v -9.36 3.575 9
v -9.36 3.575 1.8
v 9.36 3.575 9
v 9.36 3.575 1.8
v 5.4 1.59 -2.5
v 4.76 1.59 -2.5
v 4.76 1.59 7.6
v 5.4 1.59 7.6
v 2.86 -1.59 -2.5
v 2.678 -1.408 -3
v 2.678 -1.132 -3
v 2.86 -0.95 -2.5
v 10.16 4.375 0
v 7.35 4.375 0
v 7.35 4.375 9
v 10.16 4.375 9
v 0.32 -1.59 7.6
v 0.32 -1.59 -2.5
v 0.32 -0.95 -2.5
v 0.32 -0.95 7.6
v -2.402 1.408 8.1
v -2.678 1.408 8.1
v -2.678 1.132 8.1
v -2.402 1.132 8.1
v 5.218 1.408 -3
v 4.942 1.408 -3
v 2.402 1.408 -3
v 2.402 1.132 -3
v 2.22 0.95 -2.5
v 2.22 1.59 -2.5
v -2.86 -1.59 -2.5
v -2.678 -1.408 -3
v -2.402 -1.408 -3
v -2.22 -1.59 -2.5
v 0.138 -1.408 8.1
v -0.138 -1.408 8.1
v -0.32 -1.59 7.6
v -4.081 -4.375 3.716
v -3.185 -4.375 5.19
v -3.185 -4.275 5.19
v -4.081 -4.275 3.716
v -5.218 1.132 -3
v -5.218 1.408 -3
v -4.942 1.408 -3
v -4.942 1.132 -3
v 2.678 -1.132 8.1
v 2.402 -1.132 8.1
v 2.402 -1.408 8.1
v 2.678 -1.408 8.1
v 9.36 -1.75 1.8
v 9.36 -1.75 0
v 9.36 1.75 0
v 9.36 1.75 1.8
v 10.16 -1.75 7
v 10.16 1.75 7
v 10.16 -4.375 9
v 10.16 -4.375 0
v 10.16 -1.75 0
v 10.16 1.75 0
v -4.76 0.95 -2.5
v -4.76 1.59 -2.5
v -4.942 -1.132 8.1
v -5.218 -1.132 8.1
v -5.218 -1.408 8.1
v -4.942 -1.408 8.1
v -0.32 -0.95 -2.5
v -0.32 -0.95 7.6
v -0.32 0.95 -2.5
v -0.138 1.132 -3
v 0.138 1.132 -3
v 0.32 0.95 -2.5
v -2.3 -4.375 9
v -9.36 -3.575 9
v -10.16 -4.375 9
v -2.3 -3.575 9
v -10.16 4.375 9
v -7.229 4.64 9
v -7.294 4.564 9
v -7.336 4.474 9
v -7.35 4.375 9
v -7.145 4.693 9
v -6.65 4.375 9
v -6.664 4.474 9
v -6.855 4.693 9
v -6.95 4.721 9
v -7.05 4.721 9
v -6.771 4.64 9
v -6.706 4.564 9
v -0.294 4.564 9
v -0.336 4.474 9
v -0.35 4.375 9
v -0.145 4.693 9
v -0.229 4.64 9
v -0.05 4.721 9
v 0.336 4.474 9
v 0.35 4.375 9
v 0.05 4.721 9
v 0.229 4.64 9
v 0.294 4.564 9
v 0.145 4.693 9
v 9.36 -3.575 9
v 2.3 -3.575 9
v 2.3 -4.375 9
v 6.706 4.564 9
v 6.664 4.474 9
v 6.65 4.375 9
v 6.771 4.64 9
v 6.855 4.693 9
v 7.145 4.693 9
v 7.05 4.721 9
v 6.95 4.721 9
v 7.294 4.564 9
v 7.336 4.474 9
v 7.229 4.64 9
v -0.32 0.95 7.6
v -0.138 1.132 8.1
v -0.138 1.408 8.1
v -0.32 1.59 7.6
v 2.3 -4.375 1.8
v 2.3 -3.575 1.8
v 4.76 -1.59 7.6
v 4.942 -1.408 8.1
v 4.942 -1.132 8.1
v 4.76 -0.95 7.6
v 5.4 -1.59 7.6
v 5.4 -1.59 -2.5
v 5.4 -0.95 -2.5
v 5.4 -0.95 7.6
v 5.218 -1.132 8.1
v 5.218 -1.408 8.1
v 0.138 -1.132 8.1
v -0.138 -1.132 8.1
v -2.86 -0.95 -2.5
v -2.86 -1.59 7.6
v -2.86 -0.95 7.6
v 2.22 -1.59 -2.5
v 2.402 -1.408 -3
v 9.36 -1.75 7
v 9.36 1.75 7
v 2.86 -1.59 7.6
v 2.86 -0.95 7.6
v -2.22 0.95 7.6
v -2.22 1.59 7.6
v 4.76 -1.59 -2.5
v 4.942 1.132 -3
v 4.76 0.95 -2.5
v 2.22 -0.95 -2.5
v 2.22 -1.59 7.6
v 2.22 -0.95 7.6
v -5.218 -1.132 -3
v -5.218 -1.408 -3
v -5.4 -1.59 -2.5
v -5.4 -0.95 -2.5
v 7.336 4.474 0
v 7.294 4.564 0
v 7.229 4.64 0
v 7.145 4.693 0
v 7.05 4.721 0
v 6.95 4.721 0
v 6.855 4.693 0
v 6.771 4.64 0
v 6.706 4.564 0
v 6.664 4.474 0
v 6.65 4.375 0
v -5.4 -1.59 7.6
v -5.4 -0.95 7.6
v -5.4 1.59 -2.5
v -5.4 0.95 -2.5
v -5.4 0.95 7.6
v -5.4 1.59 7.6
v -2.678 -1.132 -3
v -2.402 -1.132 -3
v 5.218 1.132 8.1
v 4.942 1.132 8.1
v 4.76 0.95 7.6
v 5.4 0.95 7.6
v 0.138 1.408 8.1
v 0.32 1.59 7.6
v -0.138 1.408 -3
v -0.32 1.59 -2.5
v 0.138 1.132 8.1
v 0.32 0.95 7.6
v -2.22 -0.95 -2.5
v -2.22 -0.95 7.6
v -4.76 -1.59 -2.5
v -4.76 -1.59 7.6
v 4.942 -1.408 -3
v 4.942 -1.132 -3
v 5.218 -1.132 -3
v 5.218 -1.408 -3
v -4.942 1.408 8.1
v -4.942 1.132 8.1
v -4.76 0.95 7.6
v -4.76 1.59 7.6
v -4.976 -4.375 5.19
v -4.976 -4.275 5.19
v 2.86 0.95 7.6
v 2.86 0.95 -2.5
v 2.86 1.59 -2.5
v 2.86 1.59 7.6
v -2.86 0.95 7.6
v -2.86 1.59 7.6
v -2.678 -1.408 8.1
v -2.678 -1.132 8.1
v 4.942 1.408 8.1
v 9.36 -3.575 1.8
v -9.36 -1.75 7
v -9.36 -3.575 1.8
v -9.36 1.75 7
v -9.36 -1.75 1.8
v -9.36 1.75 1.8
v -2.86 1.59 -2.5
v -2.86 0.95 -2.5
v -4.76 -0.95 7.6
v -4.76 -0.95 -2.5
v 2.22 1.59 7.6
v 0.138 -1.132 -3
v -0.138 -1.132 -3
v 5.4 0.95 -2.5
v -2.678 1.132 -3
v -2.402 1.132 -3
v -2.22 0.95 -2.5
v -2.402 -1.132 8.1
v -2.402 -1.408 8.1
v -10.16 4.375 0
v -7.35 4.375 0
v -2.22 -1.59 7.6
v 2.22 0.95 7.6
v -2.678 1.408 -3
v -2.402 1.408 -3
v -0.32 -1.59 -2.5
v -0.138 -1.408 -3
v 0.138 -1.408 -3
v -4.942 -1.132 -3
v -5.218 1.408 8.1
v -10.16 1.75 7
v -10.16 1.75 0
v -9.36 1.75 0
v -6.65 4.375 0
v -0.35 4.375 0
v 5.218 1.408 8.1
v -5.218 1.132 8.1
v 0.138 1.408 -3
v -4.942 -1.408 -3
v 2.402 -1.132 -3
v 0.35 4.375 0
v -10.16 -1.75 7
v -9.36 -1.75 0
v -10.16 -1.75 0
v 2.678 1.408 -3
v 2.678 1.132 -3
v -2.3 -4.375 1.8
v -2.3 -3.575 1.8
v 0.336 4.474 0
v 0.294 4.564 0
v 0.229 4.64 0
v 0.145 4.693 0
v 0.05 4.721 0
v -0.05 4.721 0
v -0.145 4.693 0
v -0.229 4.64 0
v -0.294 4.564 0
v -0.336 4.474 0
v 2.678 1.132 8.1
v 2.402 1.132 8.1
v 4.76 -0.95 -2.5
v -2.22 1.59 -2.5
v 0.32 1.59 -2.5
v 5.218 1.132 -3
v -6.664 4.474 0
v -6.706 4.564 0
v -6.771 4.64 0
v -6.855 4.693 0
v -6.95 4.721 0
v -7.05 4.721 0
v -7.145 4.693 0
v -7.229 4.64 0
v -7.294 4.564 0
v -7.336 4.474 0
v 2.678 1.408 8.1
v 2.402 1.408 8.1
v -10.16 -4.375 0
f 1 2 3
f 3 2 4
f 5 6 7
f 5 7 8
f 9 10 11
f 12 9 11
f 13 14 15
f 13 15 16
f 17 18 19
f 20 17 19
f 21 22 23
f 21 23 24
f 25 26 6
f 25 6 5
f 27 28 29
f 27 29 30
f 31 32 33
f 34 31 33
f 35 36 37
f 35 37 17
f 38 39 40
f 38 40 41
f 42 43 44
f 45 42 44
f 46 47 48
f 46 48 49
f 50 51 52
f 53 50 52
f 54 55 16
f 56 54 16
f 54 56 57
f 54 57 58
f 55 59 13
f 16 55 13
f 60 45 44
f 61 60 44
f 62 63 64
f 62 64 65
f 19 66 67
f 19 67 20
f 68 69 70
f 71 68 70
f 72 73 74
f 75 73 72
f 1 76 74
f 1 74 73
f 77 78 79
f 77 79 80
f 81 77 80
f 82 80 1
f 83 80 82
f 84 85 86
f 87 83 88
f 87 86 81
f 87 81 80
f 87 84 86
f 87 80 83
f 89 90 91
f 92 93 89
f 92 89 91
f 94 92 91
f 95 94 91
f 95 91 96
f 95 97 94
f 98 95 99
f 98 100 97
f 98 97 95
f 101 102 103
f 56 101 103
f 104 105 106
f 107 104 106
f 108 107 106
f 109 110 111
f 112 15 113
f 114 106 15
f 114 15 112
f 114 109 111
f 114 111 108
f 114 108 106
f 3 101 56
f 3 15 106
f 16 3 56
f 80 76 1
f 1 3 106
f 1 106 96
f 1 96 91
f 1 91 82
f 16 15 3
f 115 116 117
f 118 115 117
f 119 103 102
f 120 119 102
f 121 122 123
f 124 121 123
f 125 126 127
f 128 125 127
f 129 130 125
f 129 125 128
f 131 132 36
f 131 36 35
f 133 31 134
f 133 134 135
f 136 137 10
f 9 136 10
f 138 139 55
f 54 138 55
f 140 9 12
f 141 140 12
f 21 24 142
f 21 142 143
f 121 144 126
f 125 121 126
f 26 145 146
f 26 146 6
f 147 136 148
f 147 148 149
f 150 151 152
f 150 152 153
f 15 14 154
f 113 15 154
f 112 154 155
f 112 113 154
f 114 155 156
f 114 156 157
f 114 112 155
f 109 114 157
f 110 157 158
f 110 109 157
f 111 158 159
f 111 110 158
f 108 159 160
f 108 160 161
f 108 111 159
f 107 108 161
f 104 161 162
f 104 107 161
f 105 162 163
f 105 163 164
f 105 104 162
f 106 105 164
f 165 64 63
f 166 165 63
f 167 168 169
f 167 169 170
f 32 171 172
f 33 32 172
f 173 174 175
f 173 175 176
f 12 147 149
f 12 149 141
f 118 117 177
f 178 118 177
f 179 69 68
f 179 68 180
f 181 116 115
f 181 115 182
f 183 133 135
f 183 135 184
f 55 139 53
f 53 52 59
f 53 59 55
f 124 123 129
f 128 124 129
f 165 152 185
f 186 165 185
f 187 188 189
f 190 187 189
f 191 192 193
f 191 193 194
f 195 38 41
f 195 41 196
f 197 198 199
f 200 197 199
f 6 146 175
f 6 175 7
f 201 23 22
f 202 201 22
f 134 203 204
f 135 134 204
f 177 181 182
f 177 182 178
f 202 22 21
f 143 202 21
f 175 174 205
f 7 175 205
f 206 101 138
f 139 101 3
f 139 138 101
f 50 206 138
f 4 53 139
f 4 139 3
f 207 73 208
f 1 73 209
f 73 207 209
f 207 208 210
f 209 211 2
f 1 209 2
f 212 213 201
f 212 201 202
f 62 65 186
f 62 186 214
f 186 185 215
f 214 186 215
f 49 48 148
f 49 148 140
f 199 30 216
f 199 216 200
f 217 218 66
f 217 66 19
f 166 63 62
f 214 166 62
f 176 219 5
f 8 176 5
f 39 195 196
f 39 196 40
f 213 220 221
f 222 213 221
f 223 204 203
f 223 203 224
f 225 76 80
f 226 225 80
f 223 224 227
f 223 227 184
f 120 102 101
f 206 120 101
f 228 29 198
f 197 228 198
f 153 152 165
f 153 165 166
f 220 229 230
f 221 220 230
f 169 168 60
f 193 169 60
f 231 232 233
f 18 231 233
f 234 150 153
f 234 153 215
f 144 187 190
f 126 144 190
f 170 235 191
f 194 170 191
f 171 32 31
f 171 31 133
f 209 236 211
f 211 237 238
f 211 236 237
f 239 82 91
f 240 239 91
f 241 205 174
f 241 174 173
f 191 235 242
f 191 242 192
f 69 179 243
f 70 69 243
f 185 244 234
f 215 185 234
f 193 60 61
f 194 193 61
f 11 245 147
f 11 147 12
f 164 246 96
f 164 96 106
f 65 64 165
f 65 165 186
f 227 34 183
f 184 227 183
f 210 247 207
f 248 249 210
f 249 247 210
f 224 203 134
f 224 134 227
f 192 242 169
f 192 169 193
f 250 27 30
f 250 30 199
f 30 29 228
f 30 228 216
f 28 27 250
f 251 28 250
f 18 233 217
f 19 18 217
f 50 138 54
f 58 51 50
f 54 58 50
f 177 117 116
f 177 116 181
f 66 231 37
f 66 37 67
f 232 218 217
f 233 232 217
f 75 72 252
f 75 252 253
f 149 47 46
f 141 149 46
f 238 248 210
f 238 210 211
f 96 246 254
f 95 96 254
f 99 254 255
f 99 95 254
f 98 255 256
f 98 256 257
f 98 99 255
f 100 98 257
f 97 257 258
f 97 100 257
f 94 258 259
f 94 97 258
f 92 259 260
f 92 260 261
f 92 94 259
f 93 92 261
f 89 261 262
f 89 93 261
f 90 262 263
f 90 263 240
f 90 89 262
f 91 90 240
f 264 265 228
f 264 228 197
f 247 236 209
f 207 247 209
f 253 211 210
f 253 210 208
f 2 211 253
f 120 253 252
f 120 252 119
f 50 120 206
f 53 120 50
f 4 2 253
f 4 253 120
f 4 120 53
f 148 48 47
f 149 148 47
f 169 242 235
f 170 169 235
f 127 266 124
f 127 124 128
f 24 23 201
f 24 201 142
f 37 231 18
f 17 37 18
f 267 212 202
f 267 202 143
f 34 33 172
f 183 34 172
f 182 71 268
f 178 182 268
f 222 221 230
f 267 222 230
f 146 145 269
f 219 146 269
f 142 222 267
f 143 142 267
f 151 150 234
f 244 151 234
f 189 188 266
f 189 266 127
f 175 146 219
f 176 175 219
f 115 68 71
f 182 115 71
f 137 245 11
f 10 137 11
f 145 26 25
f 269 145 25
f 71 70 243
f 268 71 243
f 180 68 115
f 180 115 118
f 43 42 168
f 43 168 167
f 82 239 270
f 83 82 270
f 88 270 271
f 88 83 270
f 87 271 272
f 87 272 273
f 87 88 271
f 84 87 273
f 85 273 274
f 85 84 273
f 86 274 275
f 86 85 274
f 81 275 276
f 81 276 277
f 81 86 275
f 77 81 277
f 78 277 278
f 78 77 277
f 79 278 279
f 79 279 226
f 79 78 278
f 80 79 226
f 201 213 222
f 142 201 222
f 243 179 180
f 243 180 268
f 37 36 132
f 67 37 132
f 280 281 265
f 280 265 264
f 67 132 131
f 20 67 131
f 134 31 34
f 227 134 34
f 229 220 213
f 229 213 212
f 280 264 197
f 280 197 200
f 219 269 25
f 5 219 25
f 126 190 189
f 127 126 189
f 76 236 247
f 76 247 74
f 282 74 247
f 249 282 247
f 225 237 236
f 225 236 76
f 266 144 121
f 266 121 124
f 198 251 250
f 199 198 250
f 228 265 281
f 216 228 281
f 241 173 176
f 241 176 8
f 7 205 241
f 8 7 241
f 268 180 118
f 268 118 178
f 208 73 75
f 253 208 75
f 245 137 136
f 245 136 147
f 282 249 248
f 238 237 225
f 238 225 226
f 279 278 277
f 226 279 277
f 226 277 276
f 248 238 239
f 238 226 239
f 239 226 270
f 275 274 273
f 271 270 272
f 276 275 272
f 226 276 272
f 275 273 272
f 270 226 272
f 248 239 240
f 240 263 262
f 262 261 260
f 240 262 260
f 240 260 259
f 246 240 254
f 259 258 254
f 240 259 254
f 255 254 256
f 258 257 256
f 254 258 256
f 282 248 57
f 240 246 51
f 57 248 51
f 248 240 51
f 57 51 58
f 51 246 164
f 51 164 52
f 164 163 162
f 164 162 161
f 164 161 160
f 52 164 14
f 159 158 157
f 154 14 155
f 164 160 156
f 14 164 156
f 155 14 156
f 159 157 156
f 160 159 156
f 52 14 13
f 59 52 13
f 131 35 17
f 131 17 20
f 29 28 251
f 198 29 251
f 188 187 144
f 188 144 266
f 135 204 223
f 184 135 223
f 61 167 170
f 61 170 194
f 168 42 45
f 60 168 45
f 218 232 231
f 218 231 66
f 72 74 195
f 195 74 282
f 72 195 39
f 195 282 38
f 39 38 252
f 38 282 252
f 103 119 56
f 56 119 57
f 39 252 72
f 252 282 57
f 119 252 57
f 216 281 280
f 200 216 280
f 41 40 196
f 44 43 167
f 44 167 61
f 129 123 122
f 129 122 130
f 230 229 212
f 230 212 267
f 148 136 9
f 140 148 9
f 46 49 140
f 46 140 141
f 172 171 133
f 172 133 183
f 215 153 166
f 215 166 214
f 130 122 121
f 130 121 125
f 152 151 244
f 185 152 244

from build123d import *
from OCP.BRepFilletAPI import BRepFilletAPI_MakeChamfer

# Parameters (mm, degrees)
SKETCH_1_W               = 20.32
SKETCH_1_H               = 8.75
EXTRUDE_1_DEPTH          = 1.8
SKETCH_2_W               = 20.32
SKETCH_2_H               = 8.75
SKETCH_2_W_2             = 18.72
SKETCH_2_H_2             = 7.15
EXTRUDE_2_DEPTH          = 7.2
CUT_EXTRUDE_START        = -1.8
SKETCH_3_W               = 0.8
SKETCH_3_H               = 3.5
CUT_EXTRUDE_1_DEPTH      = 7
SKETCH_4_W               = 4.6
SKETCH_4_H               = 0.8
CUT_EXTRUDE_2_DEPTH      = 7.2
EXTRUDE_3_DEPTH          = 6.3
EXTRUDE_3_DEPTH_BACK     = 4.8
SKETCH_5_W               = 0.64
SKETCH_5_H               = 0.64
CHAMFER_2_SIZE           = 0.5
CHAMFER_2_SIZE2          = 0.181985117
CHAMFER_8_SIZE           = 0.5
CHAMFER_8_SIZE2          = 0.181985117
CUT_EXTRUDE_3_DEPTH      = 0.1
PATTERN_LINEAR_1_COUNT   = 3
PATTERN_LINEAR_1_PITCH   = 2.54
PATTERN_LINEAR_1_2_COUNT = 2
PATTERN_LINEAR_1_2_PITCH = 2.54
SKETCH_7_R               = 0.35
EXTRUDE_4_DEPTH          = 9


with BuildPart() as part:
    # Эскиз1 → Бобышка-Вытянуть1 (new body)
    with BuildSketch(Plane.XY):
        Rectangle(SKETCH_1_W, SKETCH_1_H)
    extrude(amount=EXTRUDE_1_DEPTH)

    # Эскиз2 → Бобышка-Вытянуть2 (add)
    with BuildSketch(Plane.XY.offset(1.8)):
        Rectangle(SKETCH_2_W, SKETCH_2_H)
        Rectangle(SKETCH_2_W_2, SKETCH_2_H_2, mode=Mode.SUBTRACT)
    extrude(amount=EXTRUDE_2_DEPTH)

    # Эскиз3 → Вырез-Вытянуть1 (cut)
    with BuildSketch(Plane.XY.offset(1.8).offset(CUT_EXTRUDE_START)):
        with Locations((9.76, 0)):
            Rectangle(SKETCH_3_W, SKETCH_3_H)
        with Locations((-9.76, 0)):
            Rectangle(SKETCH_3_W, SKETCH_3_H)
    extrude(amount=CUT_EXTRUDE_1_DEPTH, mode=Mode.SUBTRACT)

    # Эскиз4 → Вырез-Вытянуть2 (cut)
    with BuildSketch(Plane.XY.offset(9)):
        with Locations((0, -3.975)):
            Rectangle(SKETCH_4_W, SKETCH_4_H)
    extrude(amount=-CUT_EXTRUDE_2_DEPTH, mode=Mode.SUBTRACT)

    # Эскиз6 → Вырез-Вытянуть3 (cut)
    with BuildSketch(Plane.XZ.offset(4.375)):
        Polygon((-4.976440372, 5.189720174), (-3.184624847, 5.189720174), (-4.08053261, 3.716247509), align=None)
    extrude(amount=-CUT_EXTRUDE_3_DEPTH, mode=Mode.SUBTRACT)

    # Эскиз7 → Бобышка-Вытянуть4 (add)
    with BuildSketch(Plane.XY.offset(9)):
        with Locations((0, 4.375)):
            Circle(SKETCH_7_R)
        with Locations((7, 4.375)):
            Circle(SKETCH_7_R)
        with Locations((-7, 4.375)):
            Circle(SKETCH_7_R)
    extrude(amount=-EXTRUDE_4_DEPTH)


with BuildPart() as body_2:
    # Эскиз5 → Бобышка-Вытянуть3 (new, two sides: drawn at the far end of the back side and taken through both)
    with BuildSketch(Plane.XY.offset(1.8).offset(-EXTRUDE_3_DEPTH_BACK)):
        with Locations((0, 1.27)):
            Rectangle(SKETCH_5_W, SKETCH_5_H)
    extrude(amount=EXTRUDE_3_DEPTH + EXTRUDE_3_DEPTH_BACK)

    # Фаска2: one chamfer whose edges measure the first distance from different faces: ONE call of the kernel's chamfer builder (chamfer() names one face for all edges)
    chamfer_2_edges_1 = [body_2.edges().sort_by_distance(p)[0] for p in [
        (-0.32, 1.27, -3),
    ]]
    chamfer_2_side_1 = [body_2.faces().sort_by_distance(p)[0] for p in [
        (-0.32, 1.27, 2.55),
    ]]
    chamfer_2_edges_2 = [body_2.edges().sort_by_distance(p)[0] for p in [
        (0, 1.59, -3),
    ]]
    chamfer_2_side_2 = [body_2.faces().sort_by_distance(p)[0] for p in [
        (0, 1.59, 2.55),
    ]]
    chamfer_2_edges_3 = [body_2.edges().sort_by_distance(p)[0] for p in [
        (0.32, 1.27, -3),
    ]]
    chamfer_2_side_3 = [body_2.faces().sort_by_distance(p)[0] for p in [
        (0.32, 1.27, 2.55),
    ]]
    chamfer_2_edges_4 = [body_2.edges().sort_by_distance(p)[0] for p in [
        (0, 0.95, -3),
    ]]
    chamfer_2_side_4 = [body_2.faces().sort_by_distance(p)[0] for p in [
        (0, 0.95, 2.55),
    ]]
    chamfer_2 = BRepFilletAPI_MakeChamfer(body_2.part.solid().wrapped)
    for e in chamfer_2_edges_1:
        chamfer_2.Add(CHAMFER_2_SIZE, CHAMFER_2_SIZE2, e.wrapped, chamfer_2_side_1[0].wrapped)  # the first distance lies on this face
    for e in chamfer_2_edges_2:
        chamfer_2.Add(CHAMFER_2_SIZE, CHAMFER_2_SIZE2, e.wrapped, chamfer_2_side_2[0].wrapped)  # the first distance lies on this face
    for e in chamfer_2_edges_3:
        chamfer_2.Add(CHAMFER_2_SIZE, CHAMFER_2_SIZE2, e.wrapped, chamfer_2_side_3[0].wrapped)  # the first distance lies on this face
    for e in chamfer_2_edges_4:
        chamfer_2.Add(CHAMFER_2_SIZE, CHAMFER_2_SIZE2, e.wrapped, chamfer_2_side_4[0].wrapped)  # the first distance lies on this face
    add(Compound.cast(chamfer_2.Shape()), mode=Mode.REPLACE)

    # Фаска8: one chamfer whose edges measure the first distance from different faces: ONE call of the kernel's chamfer builder (chamfer() names one face for all edges)
    chamfer_8_edges_1 = [body_2.edges().sort_by_distance(p)[0] for p in [
        (0, 1.59, 8.1),
    ]]
    chamfer_8_side_1 = [body_2.faces().sort_by_distance(p)[0] for p in [
        (0, 1.59, 2.8),
    ]]
    chamfer_8_edges_2 = [body_2.edges().sort_by_distance(p)[0] for p in [
        (0.32, 1.27, 8.1),
    ]]
    chamfer_8_side_2 = [body_2.faces().sort_by_distance(p)[0] for p in [
        (0.32, 1.27, 2.8),
    ]]
    chamfer_8_edges_3 = [body_2.edges().sort_by_distance(p)[0] for p in [
        (0, 0.95, 8.1),
    ]]
    chamfer_8_side_3 = [body_2.faces().sort_by_distance(p)[0] for p in [
        (0, 0.95, 2.8),
    ]]
    chamfer_8_edges_4 = [body_2.edges().sort_by_distance(p)[0] for p in [
        (-0.32, 1.27, 8.1),
    ]]
    chamfer_8_side_4 = [body_2.faces().sort_by_distance(p)[0] for p in [
        (-0.32, 1.27, 2.8),
    ]]
    chamfer_8 = BRepFilletAPI_MakeChamfer(body_2.part.solid().wrapped)
    for e in chamfer_8_edges_1:
        chamfer_8.Add(CHAMFER_8_SIZE, CHAMFER_8_SIZE2, e.wrapped, chamfer_8_side_1[0].wrapped)  # the first distance lies on this face
    for e in chamfer_8_edges_2:
        chamfer_8.Add(CHAMFER_8_SIZE, CHAMFER_8_SIZE2, e.wrapped, chamfer_8_side_2[0].wrapped)  # the first distance lies on this face
    for e in chamfer_8_edges_3:
        chamfer_8.Add(CHAMFER_8_SIZE, CHAMFER_8_SIZE2, e.wrapped, chamfer_8_side_3[0].wrapped)  # the first distance lies on this face
    for e in chamfer_8_edges_4:
        chamfer_8.Add(CHAMFER_8_SIZE, CHAMFER_8_SIZE2, e.wrapped, chamfer_8_side_4[0].wrapped)  # the first distance lies on this face
    add(Compound.cast(chamfer_8.Shape()), mode=Mode.REPLACE)


with BuildPart() as pattern_linear_1_1:
    # Линейный массив1: pattern copy
    add(body_2.part.moved(Location(Vector(-1, 0, 0) * (1 * PATTERN_LINEAR_1_PITCH))))


with BuildPart() as pattern_linear_1_2:
    # Линейный массив1: pattern copy
    add(body_2.part.moved(Location(Vector(-1, 0, 0) * (2 * PATTERN_LINEAR_1_PITCH))))


with BuildPart() as pattern_linear_1_2_1:
    # Pattern Linear 1 2: pattern copy
    add(body_2.part.moved(Location(Vector(0, -1, 0) * (1 * PATTERN_LINEAR_1_2_PITCH))))


with BuildPart() as pattern_linear_1_2_2:
    # Pattern Linear 1 2: pattern copy
    add(pattern_linear_1_1.part.moved(Location(Vector(0, -1, 0) * (1 * PATTERN_LINEAR_1_2_PITCH))))


with BuildPart() as pattern_linear_1_2_3:
    # Pattern Linear 1 2: pattern copy
    add(pattern_linear_1_2.part.moved(Location(Vector(0, -1, 0) * (1 * PATTERN_LINEAR_1_2_PITCH))))


with BuildPart() as body_8:
    # Линейный массив2: read off the stored shape, not the designer's step
    # Линейный массив2: copy of Линейный массив1 2_3
    add(pattern_linear_1_2_3.part.moved(Location((10.16, 0, 0))))


with BuildPart() as body_9:
    # Pattern Linear 2 2: copy of Линейный массив1 2_3
    add(pattern_linear_1_2_3.part.moved(Location((7.62, 0, 0))))


with BuildPart() as body_10:
    # Pattern Linear 2 3: copy of Линейный массив1 2_3
    add(pattern_linear_1_2_3.part.moved(Location((10.16, 2.54, 0))))


with BuildPart() as body_11:
    # Pattern Linear 2 4: copy of Линейный массив1 2_3
    add(pattern_linear_1_2_3.part.moved(Location((7.62, 2.54, 0))))


solid = Compound([part.part, body_2.part, pattern_linear_1_1.part, pattern_linear_1_2.part, pattern_linear_1_2_1.part, pattern_linear_1_2_2.part, pattern_linear_1_2_3.part, body_8.part, body_9.part, body_10.part, body_11.part])
